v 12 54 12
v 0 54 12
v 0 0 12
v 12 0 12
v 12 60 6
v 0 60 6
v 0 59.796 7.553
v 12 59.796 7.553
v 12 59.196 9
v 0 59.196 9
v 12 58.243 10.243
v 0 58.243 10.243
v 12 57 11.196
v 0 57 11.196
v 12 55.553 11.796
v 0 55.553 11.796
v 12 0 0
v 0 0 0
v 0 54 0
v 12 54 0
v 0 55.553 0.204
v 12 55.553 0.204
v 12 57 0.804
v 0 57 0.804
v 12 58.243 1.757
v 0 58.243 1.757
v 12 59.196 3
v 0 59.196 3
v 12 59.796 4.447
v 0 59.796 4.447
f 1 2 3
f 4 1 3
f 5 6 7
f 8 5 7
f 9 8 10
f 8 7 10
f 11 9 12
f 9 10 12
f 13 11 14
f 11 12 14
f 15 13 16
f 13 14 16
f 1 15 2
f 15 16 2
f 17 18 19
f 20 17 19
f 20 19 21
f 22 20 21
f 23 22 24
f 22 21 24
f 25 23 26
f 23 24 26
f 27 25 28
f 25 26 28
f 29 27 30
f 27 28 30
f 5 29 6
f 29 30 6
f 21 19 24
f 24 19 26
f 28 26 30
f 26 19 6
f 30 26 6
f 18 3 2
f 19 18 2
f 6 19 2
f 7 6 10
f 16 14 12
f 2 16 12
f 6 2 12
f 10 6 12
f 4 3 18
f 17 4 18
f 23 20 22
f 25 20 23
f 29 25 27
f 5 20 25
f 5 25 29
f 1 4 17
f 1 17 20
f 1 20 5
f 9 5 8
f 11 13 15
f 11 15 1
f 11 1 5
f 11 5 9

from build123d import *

# Parameters (mm, degrees)
F1_DEPTH = 12


with BuildPart() as f1:
    # F0 (on Right) → F1 (new body)
    with BuildSketch(Plane.YZ):
        with BuildLine():
            Line((0, 12), (0, 0))
            Line((0, 0), (54, 0))
            ThreePointArc((54, 0), (58.242641, 1.757359), (60, 6))
            ThreePointArc((60, 6), (58.242641, 10.242641), (54, 12))
            Line((54, 12), (0, 12))
        make_face()
    extrude(amount=F1_DEPTH)


solid = f1.part
